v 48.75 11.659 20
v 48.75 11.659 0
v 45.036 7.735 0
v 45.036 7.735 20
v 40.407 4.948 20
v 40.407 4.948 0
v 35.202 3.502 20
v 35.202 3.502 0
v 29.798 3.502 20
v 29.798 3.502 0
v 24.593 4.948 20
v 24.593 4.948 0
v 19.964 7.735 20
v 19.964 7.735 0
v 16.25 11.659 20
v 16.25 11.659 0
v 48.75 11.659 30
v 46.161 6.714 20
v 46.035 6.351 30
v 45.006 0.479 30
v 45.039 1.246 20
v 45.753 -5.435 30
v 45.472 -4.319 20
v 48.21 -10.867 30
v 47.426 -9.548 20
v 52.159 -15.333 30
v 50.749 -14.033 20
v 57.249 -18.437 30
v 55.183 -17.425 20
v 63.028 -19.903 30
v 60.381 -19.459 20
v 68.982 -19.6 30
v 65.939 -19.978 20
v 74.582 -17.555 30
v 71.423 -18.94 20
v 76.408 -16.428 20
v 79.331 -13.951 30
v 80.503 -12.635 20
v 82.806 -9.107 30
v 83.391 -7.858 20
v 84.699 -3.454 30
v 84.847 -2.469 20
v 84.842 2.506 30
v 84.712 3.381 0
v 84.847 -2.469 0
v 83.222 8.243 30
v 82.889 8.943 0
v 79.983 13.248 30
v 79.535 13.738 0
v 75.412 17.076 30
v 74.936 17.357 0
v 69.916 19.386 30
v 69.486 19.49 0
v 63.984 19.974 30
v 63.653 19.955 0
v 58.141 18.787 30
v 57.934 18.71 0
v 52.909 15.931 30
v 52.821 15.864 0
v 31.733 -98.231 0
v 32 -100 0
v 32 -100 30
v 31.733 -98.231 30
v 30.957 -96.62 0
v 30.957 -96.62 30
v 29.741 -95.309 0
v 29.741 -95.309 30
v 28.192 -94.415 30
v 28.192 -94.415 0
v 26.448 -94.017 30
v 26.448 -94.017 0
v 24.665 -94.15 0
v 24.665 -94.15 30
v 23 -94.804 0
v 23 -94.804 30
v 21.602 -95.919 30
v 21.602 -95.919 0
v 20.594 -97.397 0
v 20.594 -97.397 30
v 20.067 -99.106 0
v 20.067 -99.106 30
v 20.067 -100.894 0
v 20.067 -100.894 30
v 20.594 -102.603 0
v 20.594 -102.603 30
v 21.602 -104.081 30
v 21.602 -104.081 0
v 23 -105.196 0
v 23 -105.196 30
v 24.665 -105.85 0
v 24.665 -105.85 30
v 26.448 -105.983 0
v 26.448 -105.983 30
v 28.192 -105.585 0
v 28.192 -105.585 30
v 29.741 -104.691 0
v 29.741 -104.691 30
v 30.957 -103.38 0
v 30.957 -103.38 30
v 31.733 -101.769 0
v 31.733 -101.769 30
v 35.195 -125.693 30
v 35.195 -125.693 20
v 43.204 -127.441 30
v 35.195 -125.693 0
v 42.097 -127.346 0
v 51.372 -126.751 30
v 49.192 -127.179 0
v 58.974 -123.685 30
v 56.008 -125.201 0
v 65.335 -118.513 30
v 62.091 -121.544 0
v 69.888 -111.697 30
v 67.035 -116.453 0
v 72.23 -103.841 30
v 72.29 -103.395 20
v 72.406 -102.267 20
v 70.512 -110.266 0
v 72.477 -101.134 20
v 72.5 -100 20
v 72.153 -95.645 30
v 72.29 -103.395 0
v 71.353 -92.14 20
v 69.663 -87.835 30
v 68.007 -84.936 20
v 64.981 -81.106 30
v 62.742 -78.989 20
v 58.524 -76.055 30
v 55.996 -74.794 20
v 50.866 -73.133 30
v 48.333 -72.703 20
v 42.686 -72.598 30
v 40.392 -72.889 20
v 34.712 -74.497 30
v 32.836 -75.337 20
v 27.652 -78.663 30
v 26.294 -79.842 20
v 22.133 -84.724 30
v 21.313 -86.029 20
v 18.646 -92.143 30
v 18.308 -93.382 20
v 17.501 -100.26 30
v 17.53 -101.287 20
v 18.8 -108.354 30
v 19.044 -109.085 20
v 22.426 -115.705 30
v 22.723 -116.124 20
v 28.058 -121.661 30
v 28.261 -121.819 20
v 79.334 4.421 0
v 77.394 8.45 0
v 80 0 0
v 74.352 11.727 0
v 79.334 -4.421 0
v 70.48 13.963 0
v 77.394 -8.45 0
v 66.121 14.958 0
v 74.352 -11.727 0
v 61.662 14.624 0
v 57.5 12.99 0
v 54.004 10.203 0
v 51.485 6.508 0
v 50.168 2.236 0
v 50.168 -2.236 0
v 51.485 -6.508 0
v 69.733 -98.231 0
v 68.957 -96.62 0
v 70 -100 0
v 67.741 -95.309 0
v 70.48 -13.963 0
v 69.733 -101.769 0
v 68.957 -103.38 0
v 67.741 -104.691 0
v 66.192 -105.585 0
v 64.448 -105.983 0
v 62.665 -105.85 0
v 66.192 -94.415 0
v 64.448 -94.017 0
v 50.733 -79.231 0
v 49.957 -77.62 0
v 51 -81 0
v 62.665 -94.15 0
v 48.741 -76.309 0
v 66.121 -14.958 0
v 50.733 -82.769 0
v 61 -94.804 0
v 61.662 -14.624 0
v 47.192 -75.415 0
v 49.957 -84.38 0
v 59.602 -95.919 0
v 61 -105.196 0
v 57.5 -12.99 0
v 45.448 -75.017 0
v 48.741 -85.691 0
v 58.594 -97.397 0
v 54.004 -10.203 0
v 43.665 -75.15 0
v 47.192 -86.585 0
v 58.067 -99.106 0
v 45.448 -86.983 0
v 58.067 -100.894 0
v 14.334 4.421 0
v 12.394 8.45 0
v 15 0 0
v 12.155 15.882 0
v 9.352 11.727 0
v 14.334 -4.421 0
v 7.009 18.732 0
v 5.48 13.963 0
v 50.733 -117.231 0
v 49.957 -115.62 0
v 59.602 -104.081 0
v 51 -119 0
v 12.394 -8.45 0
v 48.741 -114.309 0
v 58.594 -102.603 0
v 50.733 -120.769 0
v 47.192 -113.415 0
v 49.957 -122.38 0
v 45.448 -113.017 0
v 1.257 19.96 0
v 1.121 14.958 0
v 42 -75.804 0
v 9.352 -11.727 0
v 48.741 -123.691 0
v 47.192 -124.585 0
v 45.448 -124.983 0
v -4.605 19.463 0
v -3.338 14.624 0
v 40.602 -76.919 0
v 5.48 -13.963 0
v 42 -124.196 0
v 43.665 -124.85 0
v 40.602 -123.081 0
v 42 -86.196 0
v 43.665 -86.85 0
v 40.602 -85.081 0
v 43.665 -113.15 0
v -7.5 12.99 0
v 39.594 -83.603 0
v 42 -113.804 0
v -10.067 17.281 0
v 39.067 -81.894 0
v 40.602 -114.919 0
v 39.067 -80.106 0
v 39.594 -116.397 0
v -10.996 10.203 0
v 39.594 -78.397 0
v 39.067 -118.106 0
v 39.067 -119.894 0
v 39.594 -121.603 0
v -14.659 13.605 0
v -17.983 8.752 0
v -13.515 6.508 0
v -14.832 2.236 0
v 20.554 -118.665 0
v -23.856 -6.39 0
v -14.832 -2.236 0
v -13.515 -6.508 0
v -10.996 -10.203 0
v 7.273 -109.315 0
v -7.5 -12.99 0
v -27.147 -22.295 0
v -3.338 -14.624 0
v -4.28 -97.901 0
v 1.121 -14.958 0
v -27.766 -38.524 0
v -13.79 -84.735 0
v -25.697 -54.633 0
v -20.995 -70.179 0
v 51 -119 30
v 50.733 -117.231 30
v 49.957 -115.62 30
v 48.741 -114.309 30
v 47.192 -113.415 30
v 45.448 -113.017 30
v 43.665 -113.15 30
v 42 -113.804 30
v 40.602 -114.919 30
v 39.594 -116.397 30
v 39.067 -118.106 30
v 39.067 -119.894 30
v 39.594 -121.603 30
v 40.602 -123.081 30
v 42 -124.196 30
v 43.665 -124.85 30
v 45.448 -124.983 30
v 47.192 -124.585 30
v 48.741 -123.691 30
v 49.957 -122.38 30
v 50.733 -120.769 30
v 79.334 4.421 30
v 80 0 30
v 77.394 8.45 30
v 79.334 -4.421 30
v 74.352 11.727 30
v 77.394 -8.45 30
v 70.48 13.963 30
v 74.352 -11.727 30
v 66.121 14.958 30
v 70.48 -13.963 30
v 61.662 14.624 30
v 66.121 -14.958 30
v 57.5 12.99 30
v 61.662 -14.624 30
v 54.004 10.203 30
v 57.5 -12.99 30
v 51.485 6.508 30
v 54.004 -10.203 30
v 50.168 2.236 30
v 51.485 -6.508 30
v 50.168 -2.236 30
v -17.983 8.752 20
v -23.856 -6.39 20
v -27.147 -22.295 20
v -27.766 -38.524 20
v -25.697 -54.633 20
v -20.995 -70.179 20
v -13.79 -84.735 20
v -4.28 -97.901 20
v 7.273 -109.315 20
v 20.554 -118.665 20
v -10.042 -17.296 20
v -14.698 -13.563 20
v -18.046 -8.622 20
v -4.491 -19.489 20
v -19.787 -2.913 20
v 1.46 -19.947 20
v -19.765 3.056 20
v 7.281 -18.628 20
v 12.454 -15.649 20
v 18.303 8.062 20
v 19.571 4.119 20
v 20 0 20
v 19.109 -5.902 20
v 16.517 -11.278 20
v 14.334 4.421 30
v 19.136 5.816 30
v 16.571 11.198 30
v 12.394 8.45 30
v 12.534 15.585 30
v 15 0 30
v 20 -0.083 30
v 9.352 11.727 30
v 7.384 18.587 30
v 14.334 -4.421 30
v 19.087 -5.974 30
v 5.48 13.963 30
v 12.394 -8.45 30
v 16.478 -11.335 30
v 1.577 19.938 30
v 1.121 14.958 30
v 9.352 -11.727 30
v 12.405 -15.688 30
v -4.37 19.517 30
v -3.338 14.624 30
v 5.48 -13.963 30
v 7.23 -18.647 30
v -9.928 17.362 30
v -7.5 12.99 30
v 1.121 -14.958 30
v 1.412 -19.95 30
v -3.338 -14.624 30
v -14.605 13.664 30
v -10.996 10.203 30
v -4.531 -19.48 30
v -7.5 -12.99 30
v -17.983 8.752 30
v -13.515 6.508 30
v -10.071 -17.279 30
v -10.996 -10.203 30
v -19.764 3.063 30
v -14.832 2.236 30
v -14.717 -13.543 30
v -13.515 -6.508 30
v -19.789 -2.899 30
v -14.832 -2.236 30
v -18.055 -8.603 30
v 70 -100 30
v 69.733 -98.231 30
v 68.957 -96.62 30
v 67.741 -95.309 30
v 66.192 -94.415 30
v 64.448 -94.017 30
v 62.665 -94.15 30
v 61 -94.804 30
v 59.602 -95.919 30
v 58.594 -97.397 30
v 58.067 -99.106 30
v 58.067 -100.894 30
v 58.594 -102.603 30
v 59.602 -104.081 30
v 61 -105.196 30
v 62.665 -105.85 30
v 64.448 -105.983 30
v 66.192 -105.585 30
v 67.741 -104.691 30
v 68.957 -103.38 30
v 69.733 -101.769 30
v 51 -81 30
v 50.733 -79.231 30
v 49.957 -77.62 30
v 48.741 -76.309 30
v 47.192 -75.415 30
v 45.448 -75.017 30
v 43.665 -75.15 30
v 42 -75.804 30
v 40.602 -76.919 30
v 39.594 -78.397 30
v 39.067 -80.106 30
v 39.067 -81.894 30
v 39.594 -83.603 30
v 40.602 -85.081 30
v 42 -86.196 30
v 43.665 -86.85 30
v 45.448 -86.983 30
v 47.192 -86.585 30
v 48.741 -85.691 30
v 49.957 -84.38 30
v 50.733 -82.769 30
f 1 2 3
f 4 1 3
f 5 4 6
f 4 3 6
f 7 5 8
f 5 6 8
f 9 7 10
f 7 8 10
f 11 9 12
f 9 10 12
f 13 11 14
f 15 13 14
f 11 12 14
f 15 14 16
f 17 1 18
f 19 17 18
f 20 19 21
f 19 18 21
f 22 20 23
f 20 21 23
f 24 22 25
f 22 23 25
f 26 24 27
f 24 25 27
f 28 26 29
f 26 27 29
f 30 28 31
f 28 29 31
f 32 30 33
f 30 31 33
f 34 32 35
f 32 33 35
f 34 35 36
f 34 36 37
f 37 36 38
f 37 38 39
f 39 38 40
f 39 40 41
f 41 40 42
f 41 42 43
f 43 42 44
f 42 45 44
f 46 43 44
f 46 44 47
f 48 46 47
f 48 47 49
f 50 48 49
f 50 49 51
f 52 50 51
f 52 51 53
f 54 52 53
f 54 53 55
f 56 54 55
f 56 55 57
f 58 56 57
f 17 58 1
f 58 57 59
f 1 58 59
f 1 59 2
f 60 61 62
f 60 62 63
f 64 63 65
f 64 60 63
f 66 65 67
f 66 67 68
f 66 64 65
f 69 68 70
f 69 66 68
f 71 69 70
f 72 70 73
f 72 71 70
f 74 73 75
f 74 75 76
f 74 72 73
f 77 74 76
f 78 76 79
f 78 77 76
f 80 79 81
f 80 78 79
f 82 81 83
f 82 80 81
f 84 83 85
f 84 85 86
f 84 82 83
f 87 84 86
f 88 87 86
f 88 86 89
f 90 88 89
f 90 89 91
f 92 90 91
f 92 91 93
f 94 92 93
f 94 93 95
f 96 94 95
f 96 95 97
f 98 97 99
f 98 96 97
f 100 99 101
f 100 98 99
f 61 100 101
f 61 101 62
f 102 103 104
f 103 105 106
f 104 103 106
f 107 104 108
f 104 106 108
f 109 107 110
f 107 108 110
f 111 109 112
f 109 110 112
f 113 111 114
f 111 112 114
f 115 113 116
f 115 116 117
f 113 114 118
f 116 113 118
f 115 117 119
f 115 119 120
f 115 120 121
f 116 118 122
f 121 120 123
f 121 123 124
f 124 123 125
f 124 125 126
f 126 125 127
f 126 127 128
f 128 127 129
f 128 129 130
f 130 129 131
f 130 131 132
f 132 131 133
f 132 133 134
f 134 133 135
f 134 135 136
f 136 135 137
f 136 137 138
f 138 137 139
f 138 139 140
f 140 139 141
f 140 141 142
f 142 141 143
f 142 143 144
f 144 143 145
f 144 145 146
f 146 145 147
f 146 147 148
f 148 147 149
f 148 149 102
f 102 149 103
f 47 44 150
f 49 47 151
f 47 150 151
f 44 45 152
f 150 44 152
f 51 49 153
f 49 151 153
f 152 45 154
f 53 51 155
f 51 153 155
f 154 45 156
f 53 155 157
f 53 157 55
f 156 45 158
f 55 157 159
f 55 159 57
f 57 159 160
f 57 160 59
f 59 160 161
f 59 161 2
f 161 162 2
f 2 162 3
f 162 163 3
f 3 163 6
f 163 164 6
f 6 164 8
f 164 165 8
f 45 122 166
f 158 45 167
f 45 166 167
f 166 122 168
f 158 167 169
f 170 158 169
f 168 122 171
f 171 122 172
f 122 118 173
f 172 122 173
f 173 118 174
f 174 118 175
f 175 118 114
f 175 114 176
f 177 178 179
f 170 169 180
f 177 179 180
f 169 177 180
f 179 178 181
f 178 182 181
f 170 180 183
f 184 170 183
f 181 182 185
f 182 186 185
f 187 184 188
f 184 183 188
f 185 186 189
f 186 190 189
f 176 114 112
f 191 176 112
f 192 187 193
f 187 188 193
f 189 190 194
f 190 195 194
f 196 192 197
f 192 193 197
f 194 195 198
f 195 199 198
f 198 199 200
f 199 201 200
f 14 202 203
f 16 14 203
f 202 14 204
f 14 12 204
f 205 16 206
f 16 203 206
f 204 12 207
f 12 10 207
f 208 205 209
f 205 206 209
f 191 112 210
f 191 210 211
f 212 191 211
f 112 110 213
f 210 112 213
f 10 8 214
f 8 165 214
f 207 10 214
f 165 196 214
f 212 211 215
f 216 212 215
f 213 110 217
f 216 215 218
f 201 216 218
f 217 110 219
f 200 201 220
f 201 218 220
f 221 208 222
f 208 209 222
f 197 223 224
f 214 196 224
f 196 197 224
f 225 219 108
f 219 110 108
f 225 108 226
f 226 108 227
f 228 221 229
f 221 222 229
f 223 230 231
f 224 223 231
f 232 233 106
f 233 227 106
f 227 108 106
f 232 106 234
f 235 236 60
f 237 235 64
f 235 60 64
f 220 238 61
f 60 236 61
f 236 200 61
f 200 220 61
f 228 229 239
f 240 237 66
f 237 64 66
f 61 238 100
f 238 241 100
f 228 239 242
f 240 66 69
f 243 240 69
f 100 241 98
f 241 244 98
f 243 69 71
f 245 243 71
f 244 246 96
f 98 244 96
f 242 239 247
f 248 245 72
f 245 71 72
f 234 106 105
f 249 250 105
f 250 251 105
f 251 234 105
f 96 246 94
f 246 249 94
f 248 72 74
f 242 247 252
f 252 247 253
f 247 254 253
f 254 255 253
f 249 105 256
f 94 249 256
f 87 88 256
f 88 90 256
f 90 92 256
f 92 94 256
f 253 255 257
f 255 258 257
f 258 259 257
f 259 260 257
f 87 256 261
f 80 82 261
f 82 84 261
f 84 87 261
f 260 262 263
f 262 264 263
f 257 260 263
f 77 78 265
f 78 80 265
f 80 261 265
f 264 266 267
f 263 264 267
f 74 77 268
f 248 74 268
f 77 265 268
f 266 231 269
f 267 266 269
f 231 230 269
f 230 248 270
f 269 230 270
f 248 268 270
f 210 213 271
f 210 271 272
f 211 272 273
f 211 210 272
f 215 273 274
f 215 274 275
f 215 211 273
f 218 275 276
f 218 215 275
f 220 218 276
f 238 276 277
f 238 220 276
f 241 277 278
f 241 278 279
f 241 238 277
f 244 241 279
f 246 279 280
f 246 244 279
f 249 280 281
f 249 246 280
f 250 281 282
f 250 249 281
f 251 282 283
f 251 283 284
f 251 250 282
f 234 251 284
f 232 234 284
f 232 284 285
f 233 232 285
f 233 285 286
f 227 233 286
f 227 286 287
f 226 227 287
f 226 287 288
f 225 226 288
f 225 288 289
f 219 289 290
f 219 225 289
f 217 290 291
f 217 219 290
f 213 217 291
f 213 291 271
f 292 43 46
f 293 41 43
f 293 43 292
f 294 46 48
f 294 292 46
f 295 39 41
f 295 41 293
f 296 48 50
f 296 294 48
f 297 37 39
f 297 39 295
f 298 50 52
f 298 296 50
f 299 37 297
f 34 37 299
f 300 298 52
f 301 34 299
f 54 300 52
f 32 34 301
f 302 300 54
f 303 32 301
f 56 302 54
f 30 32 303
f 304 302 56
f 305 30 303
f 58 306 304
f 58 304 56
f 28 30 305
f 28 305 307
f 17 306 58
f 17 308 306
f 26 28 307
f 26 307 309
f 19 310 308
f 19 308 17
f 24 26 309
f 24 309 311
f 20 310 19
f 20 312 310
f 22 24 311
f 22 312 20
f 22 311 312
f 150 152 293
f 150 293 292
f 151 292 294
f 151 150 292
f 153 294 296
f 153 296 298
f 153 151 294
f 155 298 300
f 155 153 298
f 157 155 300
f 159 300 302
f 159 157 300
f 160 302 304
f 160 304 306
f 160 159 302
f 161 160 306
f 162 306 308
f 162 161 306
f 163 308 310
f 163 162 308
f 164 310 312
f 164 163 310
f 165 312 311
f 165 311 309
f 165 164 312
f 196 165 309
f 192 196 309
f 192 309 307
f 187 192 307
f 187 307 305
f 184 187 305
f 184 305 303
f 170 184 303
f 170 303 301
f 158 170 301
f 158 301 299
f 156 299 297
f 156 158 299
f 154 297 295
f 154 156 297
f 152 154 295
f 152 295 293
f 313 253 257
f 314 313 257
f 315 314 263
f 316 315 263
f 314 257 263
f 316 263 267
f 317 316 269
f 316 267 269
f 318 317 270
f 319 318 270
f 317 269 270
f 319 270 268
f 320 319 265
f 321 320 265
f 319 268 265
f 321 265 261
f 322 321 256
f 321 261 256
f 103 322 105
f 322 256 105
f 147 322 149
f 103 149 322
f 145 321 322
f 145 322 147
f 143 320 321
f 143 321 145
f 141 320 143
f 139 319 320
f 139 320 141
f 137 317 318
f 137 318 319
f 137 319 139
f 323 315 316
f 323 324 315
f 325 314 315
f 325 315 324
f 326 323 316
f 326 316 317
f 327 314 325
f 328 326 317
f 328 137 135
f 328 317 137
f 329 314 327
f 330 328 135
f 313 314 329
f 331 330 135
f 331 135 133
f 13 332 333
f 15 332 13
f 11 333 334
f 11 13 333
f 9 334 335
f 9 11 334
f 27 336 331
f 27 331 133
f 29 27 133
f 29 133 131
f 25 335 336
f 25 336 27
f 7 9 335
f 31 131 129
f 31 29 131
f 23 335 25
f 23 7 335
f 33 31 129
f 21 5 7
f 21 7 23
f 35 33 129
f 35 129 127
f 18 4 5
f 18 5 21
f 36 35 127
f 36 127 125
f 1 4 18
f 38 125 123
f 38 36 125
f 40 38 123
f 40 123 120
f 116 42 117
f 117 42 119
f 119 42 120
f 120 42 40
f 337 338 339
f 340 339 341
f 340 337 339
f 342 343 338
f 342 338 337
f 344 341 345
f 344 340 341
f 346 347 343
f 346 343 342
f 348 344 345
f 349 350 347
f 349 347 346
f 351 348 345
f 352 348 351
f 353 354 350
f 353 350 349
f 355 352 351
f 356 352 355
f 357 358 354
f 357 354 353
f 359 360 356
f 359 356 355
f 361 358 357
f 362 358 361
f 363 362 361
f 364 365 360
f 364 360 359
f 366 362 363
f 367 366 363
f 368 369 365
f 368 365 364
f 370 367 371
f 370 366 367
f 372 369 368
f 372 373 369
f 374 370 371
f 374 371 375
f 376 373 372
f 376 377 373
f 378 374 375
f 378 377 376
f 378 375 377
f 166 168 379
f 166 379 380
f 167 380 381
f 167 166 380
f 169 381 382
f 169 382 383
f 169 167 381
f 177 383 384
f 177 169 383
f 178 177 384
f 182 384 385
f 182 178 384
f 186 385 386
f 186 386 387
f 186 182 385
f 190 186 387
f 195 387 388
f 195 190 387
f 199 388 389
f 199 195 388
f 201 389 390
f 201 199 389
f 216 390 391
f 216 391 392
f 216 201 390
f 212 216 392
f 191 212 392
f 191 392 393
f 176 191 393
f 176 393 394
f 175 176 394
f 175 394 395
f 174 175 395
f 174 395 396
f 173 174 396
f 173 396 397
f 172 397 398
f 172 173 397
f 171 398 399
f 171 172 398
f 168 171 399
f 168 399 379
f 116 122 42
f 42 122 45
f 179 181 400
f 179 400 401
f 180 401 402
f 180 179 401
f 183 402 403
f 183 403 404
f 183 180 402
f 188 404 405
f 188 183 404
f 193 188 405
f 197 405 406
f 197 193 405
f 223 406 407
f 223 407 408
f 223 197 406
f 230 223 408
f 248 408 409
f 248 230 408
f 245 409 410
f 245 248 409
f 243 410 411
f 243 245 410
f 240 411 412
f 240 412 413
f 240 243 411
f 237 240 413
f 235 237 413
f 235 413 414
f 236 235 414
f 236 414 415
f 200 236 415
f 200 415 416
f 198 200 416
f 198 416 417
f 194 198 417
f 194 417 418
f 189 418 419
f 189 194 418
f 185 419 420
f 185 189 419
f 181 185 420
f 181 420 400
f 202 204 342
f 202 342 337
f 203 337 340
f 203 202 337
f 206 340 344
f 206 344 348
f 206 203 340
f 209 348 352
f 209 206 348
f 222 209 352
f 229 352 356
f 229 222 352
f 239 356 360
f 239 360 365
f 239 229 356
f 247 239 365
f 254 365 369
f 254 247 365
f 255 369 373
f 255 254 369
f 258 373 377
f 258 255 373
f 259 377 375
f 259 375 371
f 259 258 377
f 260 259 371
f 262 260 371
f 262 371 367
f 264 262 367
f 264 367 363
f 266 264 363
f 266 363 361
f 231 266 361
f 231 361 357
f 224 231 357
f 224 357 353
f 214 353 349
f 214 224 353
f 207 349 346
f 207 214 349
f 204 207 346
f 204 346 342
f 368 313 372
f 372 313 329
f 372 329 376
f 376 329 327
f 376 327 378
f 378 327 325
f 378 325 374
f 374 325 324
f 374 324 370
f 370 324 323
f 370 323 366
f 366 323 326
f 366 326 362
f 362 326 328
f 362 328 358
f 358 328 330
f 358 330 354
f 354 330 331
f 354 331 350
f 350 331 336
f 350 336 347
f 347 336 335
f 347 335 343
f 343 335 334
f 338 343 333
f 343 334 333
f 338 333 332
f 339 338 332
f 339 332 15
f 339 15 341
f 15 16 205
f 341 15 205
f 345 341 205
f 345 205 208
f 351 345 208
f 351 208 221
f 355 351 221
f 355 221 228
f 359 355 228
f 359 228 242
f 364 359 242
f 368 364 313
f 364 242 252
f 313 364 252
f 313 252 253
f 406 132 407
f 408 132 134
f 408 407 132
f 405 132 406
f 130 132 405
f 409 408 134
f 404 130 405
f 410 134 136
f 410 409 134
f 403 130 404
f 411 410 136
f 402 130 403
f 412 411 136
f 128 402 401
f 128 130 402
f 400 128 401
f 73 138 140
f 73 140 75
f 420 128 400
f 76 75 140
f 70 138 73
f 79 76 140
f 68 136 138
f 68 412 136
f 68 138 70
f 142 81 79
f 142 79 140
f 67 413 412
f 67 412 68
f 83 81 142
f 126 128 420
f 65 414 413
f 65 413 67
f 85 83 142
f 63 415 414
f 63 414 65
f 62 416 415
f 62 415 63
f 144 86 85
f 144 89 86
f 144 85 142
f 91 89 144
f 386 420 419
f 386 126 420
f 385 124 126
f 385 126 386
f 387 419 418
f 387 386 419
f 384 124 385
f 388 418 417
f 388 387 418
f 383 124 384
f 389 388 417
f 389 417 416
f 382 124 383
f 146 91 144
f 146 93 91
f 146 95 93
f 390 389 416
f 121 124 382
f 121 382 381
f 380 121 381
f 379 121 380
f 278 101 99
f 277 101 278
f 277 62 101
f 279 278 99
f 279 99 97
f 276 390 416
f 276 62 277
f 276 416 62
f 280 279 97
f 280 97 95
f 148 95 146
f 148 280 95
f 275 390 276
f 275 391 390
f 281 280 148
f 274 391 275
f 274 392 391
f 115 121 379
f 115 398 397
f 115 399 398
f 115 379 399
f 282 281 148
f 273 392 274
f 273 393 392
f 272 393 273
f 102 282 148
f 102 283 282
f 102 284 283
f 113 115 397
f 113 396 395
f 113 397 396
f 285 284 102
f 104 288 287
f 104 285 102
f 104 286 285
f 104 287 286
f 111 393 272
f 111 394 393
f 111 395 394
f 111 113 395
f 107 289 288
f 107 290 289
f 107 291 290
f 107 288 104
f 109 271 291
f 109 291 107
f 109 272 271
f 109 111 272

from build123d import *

# Parameters (mm, degrees)
BOSS_EXTRUDE1_DEPTH = 20
SKETCH1_3_R         = 20
SKETCH1_3_R_2       = 15
SKETCH1_3_R_3       = 27.5
SKETCH1_3_R_4       = 6
BOSS_EXTRUDE2_DEPTH = 30


with BuildPart() as part:
    # Sketch1 → Boss-Extrude1 (new body)
    with BuildSketch(Plane.XY):
        with BuildLine():
            Line((72.289579528, -103.395415906), (84.84696693, -2.469393386))
            ThreePointArc((84.84696693, -2.469393386), (57.710349886, -18.624204714), (48.75, 11.659223816))
            ThreePointArc((48.75, 11.659223816), (32.5, 3.318447633), (16.25, 11.659223816))
            ThreePointArc((16.25, 11.659223816), (19.039432765, 6.123724357), (20, 0))
            ThreePointArc((20, 0), (-4.490678851, -19.489325372), (-17.983380346, 8.752030126))
            ThreePointArc((-17.983380346, 8.752030126), (-20.994881076, -70.178879235), (35.195495857, -125.692833602))
            ThreePointArc((35.195495857, -125.692833602), (29.401504302, -77.351888998), (72.5, -100))
            ThreePointArc((72.5, -100), (72.447344471, -101.700964869), (72.289579528, -103.395415906))
        make_face()
    extrude(amount=BOSS_EXTRUDE1_DEPTH)

    # Sketch1<3> → Boss-Extrude2 (add)
    # profile 1 of 3: a face of its own
    with BuildSketch(Plane.XY):
        with Locations((65, 0)):
            Circle(SKETCH1_3_R)
        with Locations((65, 0)):
            Circle(SKETCH1_3_R_2, mode=Mode.SUBTRACT)
    # profile 2 of 3: a face of its own
    with BuildSketch(Plane.XY):
        with Locations((45, -100)):
            Circle(SKETCH1_3_R_3)
        with Locations((26, -100)):
            Circle(SKETCH1_3_R_4, mode=Mode.SUBTRACT)
        with Locations((45, -119)):
            Circle(SKETCH1_3_R_4, mode=Mode.SUBTRACT)
        with Locations((64, -100)):
            Circle(SKETCH1_3_R_4, mode=Mode.SUBTRACT)
        with Locations((45, -81)):
            Circle(SKETCH1_3_R_4, mode=Mode.SUBTRACT)
    # profile 3 of 3: a face of its own
    with BuildSketch(Plane.XY):
        Circle(SKETCH1_3_R)
        Circle(SKETCH1_3_R_2, mode=Mode.SUBTRACT)
    extrude(amount=BOSS_EXTRUDE2_DEPTH)


solid = part.part
